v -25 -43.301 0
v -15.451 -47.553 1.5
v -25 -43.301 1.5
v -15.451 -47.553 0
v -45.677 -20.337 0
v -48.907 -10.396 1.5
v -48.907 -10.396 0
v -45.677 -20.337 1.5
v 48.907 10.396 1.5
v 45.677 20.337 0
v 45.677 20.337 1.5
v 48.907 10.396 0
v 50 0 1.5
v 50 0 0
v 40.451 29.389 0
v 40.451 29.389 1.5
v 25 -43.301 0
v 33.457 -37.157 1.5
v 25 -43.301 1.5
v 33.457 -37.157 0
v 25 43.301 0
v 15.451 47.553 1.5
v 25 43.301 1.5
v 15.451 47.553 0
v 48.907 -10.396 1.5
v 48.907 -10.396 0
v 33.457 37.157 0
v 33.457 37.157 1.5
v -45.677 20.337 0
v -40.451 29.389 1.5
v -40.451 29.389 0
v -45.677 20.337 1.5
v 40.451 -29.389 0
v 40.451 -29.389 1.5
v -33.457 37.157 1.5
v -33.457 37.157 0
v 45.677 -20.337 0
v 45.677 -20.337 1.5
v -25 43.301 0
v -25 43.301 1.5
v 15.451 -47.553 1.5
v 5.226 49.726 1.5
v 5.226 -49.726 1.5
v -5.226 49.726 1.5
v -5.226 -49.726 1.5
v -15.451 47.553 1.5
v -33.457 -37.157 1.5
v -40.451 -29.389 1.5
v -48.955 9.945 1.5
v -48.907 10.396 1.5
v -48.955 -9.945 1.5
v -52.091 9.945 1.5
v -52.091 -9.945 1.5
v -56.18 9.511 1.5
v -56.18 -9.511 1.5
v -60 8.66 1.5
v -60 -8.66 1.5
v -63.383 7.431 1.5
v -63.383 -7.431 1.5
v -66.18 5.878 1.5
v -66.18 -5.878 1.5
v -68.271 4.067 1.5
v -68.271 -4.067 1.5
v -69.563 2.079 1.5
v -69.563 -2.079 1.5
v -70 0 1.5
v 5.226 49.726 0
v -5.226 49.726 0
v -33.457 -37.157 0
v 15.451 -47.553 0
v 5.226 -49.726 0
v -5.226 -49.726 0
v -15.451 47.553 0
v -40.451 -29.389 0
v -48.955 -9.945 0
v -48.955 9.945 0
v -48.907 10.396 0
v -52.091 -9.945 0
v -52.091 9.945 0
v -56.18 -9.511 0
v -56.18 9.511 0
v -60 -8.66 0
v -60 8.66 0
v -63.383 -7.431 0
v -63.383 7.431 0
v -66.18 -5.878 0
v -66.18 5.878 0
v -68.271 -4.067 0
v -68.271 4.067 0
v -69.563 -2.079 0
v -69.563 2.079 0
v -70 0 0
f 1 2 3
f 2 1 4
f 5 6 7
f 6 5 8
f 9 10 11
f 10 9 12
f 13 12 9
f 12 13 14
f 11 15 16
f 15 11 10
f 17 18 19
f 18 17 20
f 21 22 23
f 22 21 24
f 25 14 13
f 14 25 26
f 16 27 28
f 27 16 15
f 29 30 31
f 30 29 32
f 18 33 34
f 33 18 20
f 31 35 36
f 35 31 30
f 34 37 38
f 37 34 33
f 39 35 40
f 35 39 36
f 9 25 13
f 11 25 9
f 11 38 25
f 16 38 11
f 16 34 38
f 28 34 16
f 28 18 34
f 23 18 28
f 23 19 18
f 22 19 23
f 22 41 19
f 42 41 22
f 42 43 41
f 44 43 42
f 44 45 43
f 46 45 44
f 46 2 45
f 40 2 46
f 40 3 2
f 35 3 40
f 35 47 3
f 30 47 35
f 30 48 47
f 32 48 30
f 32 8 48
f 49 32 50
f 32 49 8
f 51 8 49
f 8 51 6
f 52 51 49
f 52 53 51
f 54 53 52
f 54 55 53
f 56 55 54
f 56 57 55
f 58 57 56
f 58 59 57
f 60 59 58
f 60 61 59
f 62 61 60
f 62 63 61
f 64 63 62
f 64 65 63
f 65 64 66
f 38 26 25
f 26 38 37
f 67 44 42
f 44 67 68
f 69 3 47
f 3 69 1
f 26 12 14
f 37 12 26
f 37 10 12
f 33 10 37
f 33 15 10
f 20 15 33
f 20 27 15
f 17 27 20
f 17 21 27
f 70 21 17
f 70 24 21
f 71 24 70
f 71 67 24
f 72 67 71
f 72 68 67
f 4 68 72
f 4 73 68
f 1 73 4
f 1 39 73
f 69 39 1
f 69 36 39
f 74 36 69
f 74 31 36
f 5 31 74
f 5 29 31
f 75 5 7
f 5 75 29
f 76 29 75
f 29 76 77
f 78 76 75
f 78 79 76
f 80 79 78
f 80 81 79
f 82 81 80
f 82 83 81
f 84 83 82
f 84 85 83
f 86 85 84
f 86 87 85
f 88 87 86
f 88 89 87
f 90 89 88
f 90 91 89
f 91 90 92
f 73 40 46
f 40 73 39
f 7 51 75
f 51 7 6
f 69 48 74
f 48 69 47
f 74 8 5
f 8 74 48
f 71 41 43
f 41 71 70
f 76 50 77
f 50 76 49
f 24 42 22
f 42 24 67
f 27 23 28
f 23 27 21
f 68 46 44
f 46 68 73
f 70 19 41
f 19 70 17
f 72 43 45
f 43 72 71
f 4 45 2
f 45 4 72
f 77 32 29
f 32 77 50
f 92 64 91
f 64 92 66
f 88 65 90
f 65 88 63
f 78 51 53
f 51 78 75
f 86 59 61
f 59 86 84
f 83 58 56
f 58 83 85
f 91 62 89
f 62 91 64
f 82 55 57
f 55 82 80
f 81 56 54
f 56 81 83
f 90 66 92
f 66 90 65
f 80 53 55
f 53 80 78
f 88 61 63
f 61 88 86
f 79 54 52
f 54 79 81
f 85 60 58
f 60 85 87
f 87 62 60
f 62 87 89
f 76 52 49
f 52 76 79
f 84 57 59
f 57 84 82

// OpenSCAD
// Load a 100x100 pixel image.(images will be stretched to fit) Simple, high contrast images work best. Make sure to click the Invert Colors checkbox!
image_file = "c:\\Logo\\symbol_vertix_K_neg_cropped_100x100.png"; // [image_surface100x100]
height = 1.5;
radius = 50;
handle_radius = 10;
image_width = 40;
image_length = 40;


assembly();
module assembly(){
    difference(){
        union(){
               cylinder (r=radius, h=height);
               translate([-50,0,0]) {scale ([2,1,1]) cylinder (r=handle_radius, h=height);}
        }
        scale([(image_width)/100,(image_length)/100,height+1]) surface(file=image_file, center=true);
        
    };
    };
